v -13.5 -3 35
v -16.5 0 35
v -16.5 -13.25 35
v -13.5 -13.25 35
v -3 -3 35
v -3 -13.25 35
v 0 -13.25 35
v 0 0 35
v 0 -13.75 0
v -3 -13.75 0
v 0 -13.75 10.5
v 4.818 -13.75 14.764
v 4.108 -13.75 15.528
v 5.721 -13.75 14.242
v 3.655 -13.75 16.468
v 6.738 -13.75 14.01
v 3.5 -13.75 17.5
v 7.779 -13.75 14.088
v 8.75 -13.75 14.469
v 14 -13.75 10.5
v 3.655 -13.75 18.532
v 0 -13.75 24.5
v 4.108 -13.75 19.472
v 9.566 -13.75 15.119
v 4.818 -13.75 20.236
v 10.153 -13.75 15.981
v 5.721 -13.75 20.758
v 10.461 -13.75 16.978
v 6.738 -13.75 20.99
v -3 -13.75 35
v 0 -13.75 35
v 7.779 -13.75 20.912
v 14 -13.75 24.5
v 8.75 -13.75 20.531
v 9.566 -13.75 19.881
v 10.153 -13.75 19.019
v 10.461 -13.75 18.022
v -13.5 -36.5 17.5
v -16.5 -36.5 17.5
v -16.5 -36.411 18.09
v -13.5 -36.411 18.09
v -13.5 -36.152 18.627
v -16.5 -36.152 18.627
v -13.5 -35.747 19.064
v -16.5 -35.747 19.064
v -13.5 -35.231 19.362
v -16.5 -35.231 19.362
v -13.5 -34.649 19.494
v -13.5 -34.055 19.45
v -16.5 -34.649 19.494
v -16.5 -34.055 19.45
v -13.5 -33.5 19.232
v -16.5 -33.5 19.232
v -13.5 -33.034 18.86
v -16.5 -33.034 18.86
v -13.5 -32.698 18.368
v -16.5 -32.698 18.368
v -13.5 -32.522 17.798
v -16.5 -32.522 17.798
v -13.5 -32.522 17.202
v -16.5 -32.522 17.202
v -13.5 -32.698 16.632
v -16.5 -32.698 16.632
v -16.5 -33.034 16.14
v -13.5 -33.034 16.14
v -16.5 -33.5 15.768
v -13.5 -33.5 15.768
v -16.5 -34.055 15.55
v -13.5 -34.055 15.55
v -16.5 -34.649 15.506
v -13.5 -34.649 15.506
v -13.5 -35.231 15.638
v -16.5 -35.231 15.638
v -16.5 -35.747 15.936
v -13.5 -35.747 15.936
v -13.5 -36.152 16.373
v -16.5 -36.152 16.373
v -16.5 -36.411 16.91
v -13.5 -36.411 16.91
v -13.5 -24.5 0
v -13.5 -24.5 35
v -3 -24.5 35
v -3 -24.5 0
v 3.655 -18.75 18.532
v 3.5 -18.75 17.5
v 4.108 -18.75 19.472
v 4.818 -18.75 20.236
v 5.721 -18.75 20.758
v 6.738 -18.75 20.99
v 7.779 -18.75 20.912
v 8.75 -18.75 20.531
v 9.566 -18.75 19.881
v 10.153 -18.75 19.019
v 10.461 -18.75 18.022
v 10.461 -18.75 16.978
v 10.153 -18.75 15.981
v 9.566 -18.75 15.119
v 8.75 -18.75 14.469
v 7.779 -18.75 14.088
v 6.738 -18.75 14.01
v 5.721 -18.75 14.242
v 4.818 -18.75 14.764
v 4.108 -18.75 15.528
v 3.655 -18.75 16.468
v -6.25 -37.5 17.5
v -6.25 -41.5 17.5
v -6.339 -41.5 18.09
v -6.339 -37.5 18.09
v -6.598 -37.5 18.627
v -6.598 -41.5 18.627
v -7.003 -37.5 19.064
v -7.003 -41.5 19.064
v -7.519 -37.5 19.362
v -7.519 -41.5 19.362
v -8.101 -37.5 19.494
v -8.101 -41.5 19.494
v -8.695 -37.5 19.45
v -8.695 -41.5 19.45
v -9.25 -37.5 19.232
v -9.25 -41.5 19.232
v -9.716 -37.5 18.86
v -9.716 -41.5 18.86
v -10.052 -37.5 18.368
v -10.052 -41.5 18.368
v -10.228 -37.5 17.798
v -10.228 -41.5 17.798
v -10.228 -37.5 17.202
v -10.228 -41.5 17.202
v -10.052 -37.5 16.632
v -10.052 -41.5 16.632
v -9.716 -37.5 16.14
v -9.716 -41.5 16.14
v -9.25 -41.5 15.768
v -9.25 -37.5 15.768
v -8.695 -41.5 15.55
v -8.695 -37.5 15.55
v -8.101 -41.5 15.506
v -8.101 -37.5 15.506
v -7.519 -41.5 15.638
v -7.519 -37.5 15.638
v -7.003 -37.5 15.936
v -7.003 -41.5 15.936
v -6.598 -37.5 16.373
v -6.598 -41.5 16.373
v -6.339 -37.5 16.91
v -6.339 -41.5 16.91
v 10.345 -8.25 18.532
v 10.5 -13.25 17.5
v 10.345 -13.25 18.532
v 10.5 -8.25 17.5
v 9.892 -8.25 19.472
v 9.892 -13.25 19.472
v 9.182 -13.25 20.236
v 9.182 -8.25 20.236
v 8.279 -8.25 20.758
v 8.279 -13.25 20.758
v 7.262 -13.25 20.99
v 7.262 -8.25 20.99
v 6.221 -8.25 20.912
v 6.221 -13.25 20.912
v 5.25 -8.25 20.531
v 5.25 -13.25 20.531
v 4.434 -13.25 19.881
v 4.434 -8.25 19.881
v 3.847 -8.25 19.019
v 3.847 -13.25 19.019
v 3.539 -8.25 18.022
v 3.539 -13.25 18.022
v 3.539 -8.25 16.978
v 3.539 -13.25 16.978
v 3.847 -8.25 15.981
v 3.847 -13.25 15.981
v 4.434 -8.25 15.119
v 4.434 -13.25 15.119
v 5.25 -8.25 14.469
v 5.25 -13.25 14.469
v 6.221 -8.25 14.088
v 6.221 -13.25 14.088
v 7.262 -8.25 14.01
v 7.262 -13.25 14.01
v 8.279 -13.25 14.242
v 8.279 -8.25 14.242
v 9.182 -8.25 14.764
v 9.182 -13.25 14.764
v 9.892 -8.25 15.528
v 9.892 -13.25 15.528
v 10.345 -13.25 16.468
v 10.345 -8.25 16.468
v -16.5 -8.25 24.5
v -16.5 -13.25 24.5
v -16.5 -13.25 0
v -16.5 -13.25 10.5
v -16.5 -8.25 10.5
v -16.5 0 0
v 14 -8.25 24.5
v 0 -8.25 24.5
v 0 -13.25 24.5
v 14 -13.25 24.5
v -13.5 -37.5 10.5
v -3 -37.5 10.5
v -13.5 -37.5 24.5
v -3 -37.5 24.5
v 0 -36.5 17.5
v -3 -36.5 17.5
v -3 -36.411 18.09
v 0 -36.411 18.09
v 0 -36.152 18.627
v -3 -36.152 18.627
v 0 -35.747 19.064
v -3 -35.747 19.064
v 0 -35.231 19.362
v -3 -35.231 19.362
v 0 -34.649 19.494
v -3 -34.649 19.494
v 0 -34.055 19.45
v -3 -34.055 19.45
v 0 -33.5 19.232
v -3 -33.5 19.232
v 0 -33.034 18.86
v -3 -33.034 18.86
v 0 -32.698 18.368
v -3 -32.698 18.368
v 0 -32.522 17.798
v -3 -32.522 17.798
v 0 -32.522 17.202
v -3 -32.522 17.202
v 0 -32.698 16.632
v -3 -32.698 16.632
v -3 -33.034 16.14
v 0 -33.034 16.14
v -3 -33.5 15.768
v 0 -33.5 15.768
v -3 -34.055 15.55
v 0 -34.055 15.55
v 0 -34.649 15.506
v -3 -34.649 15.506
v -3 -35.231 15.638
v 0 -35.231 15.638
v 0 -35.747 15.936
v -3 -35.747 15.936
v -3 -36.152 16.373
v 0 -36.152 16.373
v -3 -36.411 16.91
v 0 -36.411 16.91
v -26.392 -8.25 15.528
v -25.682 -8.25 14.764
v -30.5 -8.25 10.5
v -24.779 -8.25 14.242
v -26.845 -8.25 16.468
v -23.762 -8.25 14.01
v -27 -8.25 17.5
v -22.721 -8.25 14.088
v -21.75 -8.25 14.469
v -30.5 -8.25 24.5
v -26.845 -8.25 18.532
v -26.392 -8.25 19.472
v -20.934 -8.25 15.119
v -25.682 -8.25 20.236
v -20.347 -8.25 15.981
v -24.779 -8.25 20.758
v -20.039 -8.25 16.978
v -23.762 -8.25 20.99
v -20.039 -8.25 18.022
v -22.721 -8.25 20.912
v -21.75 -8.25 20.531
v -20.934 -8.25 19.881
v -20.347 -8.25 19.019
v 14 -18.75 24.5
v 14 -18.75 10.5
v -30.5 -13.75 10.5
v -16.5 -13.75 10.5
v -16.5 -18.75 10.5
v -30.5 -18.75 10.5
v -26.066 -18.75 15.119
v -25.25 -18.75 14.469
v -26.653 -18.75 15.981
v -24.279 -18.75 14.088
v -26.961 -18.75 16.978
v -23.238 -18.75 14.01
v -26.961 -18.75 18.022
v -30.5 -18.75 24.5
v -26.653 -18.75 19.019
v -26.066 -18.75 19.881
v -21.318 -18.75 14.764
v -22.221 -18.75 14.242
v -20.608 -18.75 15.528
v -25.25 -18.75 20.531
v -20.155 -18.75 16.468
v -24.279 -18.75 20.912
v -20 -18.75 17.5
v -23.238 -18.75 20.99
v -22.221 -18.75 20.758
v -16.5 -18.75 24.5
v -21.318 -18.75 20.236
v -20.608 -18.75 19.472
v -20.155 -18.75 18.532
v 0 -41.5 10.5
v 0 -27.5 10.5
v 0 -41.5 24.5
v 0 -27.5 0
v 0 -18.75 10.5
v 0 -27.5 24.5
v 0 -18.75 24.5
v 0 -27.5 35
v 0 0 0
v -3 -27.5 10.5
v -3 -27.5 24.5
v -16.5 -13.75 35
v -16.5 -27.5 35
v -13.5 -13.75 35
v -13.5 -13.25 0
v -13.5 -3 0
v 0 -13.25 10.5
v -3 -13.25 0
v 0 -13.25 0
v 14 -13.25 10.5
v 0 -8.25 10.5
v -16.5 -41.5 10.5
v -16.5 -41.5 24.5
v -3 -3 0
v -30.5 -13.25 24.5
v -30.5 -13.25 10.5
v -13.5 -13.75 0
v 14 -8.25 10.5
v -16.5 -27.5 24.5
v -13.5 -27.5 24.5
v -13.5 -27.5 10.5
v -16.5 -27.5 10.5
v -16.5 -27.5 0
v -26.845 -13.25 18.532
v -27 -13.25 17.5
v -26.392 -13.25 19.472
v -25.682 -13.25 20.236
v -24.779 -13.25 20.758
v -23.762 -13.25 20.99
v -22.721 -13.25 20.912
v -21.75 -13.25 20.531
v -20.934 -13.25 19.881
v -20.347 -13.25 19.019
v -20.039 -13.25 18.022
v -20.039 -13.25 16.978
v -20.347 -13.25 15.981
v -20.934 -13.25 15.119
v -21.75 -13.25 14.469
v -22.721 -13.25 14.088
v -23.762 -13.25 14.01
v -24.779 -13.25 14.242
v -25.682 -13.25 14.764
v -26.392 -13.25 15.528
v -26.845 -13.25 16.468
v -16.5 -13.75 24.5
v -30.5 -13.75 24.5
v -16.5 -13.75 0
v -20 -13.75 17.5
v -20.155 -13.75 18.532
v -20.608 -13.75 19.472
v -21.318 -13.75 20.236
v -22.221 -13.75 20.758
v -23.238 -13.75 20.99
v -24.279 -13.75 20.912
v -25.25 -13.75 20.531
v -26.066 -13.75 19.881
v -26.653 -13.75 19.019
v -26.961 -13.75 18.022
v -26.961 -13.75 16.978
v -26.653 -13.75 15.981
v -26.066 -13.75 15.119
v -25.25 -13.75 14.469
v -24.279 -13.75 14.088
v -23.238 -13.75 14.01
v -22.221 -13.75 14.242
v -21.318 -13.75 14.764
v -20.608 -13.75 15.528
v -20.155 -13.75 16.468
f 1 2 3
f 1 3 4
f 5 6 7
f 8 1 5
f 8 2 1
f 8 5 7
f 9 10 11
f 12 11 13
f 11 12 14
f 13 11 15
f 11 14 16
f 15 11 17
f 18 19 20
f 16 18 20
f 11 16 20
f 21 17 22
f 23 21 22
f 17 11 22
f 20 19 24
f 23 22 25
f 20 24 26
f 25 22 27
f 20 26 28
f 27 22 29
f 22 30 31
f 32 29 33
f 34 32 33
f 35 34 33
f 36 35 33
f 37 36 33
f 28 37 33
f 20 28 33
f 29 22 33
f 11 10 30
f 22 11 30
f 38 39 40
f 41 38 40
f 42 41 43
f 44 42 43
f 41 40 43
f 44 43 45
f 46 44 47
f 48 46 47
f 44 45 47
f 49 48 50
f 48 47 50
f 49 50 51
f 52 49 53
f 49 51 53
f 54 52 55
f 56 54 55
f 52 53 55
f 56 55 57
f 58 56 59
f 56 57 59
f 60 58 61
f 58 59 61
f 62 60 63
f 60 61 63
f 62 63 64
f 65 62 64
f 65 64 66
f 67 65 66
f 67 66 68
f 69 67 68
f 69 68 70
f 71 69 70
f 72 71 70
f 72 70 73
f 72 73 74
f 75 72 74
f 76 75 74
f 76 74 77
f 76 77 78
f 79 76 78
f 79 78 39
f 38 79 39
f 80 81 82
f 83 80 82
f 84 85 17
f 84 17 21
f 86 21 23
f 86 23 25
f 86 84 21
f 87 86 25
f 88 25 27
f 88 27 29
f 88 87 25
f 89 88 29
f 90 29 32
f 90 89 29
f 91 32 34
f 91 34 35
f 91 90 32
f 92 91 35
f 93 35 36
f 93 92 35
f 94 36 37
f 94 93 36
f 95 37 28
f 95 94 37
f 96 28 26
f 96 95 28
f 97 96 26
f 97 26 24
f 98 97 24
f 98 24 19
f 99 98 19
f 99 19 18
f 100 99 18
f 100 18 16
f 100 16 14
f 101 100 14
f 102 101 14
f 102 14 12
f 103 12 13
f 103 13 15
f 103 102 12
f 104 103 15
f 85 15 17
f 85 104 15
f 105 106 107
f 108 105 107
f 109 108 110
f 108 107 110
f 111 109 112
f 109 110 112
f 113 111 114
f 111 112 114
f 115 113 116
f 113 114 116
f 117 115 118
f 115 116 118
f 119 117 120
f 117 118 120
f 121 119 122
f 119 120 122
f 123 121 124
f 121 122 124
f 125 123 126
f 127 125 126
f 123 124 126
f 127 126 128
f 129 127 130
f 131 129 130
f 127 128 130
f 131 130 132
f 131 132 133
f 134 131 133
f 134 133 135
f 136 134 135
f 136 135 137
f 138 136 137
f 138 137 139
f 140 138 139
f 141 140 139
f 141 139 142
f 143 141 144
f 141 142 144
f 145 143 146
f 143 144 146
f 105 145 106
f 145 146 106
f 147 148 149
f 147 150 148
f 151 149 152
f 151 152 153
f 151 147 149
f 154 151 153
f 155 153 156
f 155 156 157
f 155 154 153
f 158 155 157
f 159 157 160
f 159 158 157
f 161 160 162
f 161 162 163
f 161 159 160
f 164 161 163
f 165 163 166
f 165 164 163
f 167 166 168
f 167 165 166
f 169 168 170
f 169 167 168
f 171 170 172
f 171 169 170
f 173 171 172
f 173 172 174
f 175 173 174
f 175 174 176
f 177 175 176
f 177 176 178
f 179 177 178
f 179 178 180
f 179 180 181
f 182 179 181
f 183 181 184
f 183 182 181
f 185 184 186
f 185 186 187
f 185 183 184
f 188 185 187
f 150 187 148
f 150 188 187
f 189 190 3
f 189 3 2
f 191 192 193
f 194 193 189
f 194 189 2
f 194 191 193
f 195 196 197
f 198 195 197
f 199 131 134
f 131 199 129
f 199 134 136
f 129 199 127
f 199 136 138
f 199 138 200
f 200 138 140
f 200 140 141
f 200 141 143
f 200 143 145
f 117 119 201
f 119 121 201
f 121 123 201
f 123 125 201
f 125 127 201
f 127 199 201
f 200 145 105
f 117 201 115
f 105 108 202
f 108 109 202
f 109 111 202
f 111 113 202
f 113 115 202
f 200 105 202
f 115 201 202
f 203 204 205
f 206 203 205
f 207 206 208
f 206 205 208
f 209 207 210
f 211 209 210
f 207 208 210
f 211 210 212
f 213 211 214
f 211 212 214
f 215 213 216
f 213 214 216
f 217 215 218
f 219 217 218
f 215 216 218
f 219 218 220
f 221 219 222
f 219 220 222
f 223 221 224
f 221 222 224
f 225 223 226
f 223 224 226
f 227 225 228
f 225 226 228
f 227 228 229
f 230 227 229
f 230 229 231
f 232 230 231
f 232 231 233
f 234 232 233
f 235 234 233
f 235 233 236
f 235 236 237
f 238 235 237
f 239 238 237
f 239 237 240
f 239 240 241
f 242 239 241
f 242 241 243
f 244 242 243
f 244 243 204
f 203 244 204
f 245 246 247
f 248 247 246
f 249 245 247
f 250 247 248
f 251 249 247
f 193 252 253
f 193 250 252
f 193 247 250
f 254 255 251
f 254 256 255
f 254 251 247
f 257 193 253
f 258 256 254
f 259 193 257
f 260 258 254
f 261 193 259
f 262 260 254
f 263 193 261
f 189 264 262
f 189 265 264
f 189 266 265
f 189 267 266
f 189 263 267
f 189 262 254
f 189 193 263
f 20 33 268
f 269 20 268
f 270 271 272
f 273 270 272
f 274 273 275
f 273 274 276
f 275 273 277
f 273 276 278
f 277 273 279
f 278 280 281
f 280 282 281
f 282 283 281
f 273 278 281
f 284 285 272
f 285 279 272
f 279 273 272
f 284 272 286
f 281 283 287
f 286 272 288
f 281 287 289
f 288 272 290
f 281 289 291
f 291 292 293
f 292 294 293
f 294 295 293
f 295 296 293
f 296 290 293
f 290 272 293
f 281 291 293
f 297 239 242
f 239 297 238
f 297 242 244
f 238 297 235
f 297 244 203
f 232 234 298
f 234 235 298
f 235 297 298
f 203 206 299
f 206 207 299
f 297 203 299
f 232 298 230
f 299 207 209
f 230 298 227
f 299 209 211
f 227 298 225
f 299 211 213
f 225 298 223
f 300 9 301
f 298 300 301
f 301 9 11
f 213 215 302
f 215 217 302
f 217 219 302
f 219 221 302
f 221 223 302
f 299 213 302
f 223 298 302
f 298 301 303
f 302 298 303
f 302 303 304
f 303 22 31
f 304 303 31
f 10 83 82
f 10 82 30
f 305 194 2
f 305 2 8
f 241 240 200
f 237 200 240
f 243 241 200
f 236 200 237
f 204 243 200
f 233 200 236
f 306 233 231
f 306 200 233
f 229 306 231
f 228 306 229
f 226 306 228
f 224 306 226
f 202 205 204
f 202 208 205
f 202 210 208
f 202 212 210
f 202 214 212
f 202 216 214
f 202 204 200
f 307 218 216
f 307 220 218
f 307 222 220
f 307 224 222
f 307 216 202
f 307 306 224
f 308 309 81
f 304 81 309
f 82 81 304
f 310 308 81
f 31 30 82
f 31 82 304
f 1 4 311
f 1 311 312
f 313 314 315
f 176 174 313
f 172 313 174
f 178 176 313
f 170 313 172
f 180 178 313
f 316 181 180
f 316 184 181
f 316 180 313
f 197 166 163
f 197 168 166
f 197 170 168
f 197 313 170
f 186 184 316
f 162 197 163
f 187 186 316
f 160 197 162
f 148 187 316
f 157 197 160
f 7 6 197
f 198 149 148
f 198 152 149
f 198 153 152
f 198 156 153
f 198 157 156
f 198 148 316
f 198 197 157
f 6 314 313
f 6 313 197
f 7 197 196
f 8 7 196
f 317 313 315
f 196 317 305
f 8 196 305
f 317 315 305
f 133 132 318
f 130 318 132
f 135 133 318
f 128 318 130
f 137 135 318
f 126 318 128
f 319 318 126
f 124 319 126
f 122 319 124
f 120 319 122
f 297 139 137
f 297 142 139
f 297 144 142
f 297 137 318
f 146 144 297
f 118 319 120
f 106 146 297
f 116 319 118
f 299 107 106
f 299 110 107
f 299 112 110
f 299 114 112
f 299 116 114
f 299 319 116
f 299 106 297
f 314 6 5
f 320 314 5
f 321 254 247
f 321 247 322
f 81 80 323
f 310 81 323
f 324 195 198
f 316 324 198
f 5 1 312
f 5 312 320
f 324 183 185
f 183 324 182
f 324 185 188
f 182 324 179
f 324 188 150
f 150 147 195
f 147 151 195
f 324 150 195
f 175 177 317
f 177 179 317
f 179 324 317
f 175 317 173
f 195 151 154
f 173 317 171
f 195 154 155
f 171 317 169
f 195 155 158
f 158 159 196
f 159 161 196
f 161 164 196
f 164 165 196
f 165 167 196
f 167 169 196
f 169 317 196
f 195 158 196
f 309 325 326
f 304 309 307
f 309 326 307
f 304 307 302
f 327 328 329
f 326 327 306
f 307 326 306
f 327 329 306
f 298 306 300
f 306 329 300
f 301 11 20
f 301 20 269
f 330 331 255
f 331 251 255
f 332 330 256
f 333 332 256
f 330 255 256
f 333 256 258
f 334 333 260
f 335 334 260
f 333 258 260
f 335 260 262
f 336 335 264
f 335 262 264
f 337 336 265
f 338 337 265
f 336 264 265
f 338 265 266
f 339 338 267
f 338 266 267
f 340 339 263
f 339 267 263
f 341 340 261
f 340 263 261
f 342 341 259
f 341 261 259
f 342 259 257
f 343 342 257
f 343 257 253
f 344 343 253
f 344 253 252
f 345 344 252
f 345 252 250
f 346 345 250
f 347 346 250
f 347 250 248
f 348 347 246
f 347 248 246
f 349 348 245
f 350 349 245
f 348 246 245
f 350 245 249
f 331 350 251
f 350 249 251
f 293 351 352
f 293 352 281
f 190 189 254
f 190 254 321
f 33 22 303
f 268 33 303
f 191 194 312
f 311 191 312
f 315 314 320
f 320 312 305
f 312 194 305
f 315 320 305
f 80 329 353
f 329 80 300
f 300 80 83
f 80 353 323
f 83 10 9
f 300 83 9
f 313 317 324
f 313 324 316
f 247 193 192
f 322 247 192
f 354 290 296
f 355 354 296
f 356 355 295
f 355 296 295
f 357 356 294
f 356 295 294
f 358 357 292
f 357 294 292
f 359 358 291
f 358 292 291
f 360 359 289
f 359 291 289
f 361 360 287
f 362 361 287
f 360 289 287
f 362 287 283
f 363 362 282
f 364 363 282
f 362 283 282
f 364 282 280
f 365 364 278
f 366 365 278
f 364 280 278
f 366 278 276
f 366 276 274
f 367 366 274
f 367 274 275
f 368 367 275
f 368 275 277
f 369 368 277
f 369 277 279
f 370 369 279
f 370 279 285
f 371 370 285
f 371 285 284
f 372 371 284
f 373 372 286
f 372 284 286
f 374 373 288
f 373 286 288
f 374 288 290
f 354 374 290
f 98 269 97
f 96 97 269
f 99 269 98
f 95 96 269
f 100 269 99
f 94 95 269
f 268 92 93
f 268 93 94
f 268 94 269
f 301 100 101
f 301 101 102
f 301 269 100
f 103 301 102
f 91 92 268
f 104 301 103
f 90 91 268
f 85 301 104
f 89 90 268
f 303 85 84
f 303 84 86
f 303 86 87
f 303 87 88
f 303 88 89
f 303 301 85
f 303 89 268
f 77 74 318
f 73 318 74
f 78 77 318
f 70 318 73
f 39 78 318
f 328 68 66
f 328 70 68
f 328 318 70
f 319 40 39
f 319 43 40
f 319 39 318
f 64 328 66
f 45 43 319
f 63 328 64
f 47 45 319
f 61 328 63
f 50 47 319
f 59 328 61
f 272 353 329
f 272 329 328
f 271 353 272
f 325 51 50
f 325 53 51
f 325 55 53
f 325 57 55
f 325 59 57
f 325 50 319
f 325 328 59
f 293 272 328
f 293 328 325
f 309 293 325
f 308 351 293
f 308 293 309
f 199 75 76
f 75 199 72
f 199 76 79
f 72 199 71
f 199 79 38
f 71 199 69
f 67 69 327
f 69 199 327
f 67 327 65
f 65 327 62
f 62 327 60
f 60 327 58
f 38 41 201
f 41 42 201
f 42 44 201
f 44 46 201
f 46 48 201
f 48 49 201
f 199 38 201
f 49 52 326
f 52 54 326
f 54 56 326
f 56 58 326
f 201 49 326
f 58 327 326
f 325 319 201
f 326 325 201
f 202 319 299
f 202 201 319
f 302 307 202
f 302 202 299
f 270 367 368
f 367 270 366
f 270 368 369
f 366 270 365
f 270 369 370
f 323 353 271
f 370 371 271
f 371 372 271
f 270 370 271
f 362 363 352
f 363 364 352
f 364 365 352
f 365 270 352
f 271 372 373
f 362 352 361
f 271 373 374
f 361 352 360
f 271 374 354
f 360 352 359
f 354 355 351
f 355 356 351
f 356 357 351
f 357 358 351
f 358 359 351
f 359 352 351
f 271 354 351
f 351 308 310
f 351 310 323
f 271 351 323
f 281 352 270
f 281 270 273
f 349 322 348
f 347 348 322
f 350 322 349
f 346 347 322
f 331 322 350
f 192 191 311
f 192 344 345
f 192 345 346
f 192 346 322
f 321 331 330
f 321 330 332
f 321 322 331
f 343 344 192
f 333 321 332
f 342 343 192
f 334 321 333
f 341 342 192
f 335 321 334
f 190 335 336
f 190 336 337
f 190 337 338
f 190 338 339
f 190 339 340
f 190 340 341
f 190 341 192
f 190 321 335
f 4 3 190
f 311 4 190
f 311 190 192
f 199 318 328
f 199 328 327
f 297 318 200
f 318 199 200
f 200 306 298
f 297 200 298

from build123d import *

# Parameters (mm, degrees)
F0_W      = 16.5
F0_H      = 27.5
F1_DEPTH  = 35
F2_W      = 10.5
F2_H      = 21.5
F3_DEPTH  = 35
F4_W      = 3
F4_H      = 0.5
F5_DEPTH  = 35
F6_W      = 5
F6_H      = 14
F7_DEPTH  = 14
F8_R      = 3.5
F9_DEPTH  = 5
F12_W     = 5
F12_H     = 14
F13_DEPTH = 14
F14_R     = 3.5
F15_DEPTH = 255
F17_W     = 3
F17_H     = 14
F18_DEPTH = 10
F19_W     = 16.5
F19_H     = 14
F20_DEPTH = 4
F21_R     = 2
F22_DEPTH = 4
F23_R     = 2
F24_DEPTH = 16.5


with BuildPart() as f1:
    # F0 (on Top) → F1 (new body)
    with BuildSketch(Plane.XY):
        with Locations((-8.25, -13.75)):
            Rectangle(F0_W, F0_H)
    extrude(amount=F1_DEPTH)

    # F2 (on face) → F3 (cut)
    with BuildSketch(Plane.XY.offset(35)):
        with Locations((-8.25, -13.75)):
            Rectangle(F2_W, F2_H)
    extrude(amount=-F3_DEPTH, mode=Mode.SUBTRACT)

    # F4 (on face) → F5 (cut)
    with BuildSketch(Plane.XY.offset(35)):
        with Locations((-1.5, -13.5)):
            Rectangle(F4_W, F4_H)
        with Locations((-15, -13.5)):
            Rectangle(F4_W, F4_H)
    extrude(amount=-F5_DEPTH, mode=Mode.SUBTRACT)

    # F6 (on face) → F7 (join)
    with BuildSketch(Plane(origin=(-16.5, 0, 0), x_dir=(0, -1, 0), z_dir=(-1, 0, 0))):
        with Locations((16.25, 17.5)):
            Rectangle(F6_W, F6_H)
    extrude(amount=F7_DEPTH)

    # F8 (on face) → F9 (cut)
    with BuildSketch(Plane.XZ.offset(18.75)):
        with Locations((-23.5, 17.5)):
            Circle(F8_R)
    extrude(amount=-F9_DEPTH, mode=Mode.SUBTRACT)

    # F11: F1 across plane


with BuildPart() as f1_1:
    add(f1.part)
    add(f1.part.mirror(Plane(origin=(-8.25, -6.625, 17.5), x_dir=(0, -1, 0), z_dir=(-1, 0, 0))))

    # F12 (on face) → F13 (join)
    with BuildSketch(Plane(origin=(-16.5, 0, 0), x_dir=(0, -1, 0), z_dir=(-1, 0, 0))):
        with Locations((10.75, 17.5)):
            Rectangle(F12_W, F12_H)
    extrude(amount=F13_DEPTH)

    # F14 (on face) → F15 (cut)
    with BuildSketch(Plane(origin=(0, -8.25, 0), x_dir=(-1, 0, 0), z_dir=(0, 1, 0))):
        with Locations((23.5, 17.5)):
            Circle(F14_R)
    extrude(amount=-F15_DEPTH, mode=Mode.SUBTRACT)

    # F16: F1 across plane


with BuildPart() as f1_2:
    add(f1_1.part)
    add(f1_1.part.mirror(Plane(origin=(-8.25, -6.625, 17.5), x_dir=(0, -1, 0), z_dir=(-1, 0, 0))))

    # F17 (on face) → F18 (join)
    with BuildSketch(Plane.XZ.offset(27.5)):
        with Locations((-15, 17.5)):
            Rectangle(F17_W, F17_H)
        with Locations((-1.5, 17.5)):
            Rectangle(F17_W, F17_H)
    extrude(amount=F18_DEPTH)

    # F19 (on face) → F20 (join)
    with BuildSketch(Plane.XZ.offset(37.5)):
        with Locations((-8.25, 17.5)):
            Rectangle(F19_W, F19_H)
    extrude(amount=F20_DEPTH)

    # F21 (on face) → F22 (cut)
    with BuildSketch(Plane.XZ.offset(41.5)):
        with Locations((-8.25, 17.5)):
            Circle(F21_R)
    extrude(amount=-F22_DEPTH, mode=Mode.SUBTRACT)

    # F23 (on face) → F24 (cut)
    with BuildSketch(Plane(origin=(-16.5, 0, 0), x_dir=(0, -1, 0), z_dir=(-1, 0, 0))):
        with Locations((34.5, 17.5)):
            Circle(F23_R)
    extrude(amount=-F24_DEPTH, mode=Mode.SUBTRACT)


solid = f1_2.part
